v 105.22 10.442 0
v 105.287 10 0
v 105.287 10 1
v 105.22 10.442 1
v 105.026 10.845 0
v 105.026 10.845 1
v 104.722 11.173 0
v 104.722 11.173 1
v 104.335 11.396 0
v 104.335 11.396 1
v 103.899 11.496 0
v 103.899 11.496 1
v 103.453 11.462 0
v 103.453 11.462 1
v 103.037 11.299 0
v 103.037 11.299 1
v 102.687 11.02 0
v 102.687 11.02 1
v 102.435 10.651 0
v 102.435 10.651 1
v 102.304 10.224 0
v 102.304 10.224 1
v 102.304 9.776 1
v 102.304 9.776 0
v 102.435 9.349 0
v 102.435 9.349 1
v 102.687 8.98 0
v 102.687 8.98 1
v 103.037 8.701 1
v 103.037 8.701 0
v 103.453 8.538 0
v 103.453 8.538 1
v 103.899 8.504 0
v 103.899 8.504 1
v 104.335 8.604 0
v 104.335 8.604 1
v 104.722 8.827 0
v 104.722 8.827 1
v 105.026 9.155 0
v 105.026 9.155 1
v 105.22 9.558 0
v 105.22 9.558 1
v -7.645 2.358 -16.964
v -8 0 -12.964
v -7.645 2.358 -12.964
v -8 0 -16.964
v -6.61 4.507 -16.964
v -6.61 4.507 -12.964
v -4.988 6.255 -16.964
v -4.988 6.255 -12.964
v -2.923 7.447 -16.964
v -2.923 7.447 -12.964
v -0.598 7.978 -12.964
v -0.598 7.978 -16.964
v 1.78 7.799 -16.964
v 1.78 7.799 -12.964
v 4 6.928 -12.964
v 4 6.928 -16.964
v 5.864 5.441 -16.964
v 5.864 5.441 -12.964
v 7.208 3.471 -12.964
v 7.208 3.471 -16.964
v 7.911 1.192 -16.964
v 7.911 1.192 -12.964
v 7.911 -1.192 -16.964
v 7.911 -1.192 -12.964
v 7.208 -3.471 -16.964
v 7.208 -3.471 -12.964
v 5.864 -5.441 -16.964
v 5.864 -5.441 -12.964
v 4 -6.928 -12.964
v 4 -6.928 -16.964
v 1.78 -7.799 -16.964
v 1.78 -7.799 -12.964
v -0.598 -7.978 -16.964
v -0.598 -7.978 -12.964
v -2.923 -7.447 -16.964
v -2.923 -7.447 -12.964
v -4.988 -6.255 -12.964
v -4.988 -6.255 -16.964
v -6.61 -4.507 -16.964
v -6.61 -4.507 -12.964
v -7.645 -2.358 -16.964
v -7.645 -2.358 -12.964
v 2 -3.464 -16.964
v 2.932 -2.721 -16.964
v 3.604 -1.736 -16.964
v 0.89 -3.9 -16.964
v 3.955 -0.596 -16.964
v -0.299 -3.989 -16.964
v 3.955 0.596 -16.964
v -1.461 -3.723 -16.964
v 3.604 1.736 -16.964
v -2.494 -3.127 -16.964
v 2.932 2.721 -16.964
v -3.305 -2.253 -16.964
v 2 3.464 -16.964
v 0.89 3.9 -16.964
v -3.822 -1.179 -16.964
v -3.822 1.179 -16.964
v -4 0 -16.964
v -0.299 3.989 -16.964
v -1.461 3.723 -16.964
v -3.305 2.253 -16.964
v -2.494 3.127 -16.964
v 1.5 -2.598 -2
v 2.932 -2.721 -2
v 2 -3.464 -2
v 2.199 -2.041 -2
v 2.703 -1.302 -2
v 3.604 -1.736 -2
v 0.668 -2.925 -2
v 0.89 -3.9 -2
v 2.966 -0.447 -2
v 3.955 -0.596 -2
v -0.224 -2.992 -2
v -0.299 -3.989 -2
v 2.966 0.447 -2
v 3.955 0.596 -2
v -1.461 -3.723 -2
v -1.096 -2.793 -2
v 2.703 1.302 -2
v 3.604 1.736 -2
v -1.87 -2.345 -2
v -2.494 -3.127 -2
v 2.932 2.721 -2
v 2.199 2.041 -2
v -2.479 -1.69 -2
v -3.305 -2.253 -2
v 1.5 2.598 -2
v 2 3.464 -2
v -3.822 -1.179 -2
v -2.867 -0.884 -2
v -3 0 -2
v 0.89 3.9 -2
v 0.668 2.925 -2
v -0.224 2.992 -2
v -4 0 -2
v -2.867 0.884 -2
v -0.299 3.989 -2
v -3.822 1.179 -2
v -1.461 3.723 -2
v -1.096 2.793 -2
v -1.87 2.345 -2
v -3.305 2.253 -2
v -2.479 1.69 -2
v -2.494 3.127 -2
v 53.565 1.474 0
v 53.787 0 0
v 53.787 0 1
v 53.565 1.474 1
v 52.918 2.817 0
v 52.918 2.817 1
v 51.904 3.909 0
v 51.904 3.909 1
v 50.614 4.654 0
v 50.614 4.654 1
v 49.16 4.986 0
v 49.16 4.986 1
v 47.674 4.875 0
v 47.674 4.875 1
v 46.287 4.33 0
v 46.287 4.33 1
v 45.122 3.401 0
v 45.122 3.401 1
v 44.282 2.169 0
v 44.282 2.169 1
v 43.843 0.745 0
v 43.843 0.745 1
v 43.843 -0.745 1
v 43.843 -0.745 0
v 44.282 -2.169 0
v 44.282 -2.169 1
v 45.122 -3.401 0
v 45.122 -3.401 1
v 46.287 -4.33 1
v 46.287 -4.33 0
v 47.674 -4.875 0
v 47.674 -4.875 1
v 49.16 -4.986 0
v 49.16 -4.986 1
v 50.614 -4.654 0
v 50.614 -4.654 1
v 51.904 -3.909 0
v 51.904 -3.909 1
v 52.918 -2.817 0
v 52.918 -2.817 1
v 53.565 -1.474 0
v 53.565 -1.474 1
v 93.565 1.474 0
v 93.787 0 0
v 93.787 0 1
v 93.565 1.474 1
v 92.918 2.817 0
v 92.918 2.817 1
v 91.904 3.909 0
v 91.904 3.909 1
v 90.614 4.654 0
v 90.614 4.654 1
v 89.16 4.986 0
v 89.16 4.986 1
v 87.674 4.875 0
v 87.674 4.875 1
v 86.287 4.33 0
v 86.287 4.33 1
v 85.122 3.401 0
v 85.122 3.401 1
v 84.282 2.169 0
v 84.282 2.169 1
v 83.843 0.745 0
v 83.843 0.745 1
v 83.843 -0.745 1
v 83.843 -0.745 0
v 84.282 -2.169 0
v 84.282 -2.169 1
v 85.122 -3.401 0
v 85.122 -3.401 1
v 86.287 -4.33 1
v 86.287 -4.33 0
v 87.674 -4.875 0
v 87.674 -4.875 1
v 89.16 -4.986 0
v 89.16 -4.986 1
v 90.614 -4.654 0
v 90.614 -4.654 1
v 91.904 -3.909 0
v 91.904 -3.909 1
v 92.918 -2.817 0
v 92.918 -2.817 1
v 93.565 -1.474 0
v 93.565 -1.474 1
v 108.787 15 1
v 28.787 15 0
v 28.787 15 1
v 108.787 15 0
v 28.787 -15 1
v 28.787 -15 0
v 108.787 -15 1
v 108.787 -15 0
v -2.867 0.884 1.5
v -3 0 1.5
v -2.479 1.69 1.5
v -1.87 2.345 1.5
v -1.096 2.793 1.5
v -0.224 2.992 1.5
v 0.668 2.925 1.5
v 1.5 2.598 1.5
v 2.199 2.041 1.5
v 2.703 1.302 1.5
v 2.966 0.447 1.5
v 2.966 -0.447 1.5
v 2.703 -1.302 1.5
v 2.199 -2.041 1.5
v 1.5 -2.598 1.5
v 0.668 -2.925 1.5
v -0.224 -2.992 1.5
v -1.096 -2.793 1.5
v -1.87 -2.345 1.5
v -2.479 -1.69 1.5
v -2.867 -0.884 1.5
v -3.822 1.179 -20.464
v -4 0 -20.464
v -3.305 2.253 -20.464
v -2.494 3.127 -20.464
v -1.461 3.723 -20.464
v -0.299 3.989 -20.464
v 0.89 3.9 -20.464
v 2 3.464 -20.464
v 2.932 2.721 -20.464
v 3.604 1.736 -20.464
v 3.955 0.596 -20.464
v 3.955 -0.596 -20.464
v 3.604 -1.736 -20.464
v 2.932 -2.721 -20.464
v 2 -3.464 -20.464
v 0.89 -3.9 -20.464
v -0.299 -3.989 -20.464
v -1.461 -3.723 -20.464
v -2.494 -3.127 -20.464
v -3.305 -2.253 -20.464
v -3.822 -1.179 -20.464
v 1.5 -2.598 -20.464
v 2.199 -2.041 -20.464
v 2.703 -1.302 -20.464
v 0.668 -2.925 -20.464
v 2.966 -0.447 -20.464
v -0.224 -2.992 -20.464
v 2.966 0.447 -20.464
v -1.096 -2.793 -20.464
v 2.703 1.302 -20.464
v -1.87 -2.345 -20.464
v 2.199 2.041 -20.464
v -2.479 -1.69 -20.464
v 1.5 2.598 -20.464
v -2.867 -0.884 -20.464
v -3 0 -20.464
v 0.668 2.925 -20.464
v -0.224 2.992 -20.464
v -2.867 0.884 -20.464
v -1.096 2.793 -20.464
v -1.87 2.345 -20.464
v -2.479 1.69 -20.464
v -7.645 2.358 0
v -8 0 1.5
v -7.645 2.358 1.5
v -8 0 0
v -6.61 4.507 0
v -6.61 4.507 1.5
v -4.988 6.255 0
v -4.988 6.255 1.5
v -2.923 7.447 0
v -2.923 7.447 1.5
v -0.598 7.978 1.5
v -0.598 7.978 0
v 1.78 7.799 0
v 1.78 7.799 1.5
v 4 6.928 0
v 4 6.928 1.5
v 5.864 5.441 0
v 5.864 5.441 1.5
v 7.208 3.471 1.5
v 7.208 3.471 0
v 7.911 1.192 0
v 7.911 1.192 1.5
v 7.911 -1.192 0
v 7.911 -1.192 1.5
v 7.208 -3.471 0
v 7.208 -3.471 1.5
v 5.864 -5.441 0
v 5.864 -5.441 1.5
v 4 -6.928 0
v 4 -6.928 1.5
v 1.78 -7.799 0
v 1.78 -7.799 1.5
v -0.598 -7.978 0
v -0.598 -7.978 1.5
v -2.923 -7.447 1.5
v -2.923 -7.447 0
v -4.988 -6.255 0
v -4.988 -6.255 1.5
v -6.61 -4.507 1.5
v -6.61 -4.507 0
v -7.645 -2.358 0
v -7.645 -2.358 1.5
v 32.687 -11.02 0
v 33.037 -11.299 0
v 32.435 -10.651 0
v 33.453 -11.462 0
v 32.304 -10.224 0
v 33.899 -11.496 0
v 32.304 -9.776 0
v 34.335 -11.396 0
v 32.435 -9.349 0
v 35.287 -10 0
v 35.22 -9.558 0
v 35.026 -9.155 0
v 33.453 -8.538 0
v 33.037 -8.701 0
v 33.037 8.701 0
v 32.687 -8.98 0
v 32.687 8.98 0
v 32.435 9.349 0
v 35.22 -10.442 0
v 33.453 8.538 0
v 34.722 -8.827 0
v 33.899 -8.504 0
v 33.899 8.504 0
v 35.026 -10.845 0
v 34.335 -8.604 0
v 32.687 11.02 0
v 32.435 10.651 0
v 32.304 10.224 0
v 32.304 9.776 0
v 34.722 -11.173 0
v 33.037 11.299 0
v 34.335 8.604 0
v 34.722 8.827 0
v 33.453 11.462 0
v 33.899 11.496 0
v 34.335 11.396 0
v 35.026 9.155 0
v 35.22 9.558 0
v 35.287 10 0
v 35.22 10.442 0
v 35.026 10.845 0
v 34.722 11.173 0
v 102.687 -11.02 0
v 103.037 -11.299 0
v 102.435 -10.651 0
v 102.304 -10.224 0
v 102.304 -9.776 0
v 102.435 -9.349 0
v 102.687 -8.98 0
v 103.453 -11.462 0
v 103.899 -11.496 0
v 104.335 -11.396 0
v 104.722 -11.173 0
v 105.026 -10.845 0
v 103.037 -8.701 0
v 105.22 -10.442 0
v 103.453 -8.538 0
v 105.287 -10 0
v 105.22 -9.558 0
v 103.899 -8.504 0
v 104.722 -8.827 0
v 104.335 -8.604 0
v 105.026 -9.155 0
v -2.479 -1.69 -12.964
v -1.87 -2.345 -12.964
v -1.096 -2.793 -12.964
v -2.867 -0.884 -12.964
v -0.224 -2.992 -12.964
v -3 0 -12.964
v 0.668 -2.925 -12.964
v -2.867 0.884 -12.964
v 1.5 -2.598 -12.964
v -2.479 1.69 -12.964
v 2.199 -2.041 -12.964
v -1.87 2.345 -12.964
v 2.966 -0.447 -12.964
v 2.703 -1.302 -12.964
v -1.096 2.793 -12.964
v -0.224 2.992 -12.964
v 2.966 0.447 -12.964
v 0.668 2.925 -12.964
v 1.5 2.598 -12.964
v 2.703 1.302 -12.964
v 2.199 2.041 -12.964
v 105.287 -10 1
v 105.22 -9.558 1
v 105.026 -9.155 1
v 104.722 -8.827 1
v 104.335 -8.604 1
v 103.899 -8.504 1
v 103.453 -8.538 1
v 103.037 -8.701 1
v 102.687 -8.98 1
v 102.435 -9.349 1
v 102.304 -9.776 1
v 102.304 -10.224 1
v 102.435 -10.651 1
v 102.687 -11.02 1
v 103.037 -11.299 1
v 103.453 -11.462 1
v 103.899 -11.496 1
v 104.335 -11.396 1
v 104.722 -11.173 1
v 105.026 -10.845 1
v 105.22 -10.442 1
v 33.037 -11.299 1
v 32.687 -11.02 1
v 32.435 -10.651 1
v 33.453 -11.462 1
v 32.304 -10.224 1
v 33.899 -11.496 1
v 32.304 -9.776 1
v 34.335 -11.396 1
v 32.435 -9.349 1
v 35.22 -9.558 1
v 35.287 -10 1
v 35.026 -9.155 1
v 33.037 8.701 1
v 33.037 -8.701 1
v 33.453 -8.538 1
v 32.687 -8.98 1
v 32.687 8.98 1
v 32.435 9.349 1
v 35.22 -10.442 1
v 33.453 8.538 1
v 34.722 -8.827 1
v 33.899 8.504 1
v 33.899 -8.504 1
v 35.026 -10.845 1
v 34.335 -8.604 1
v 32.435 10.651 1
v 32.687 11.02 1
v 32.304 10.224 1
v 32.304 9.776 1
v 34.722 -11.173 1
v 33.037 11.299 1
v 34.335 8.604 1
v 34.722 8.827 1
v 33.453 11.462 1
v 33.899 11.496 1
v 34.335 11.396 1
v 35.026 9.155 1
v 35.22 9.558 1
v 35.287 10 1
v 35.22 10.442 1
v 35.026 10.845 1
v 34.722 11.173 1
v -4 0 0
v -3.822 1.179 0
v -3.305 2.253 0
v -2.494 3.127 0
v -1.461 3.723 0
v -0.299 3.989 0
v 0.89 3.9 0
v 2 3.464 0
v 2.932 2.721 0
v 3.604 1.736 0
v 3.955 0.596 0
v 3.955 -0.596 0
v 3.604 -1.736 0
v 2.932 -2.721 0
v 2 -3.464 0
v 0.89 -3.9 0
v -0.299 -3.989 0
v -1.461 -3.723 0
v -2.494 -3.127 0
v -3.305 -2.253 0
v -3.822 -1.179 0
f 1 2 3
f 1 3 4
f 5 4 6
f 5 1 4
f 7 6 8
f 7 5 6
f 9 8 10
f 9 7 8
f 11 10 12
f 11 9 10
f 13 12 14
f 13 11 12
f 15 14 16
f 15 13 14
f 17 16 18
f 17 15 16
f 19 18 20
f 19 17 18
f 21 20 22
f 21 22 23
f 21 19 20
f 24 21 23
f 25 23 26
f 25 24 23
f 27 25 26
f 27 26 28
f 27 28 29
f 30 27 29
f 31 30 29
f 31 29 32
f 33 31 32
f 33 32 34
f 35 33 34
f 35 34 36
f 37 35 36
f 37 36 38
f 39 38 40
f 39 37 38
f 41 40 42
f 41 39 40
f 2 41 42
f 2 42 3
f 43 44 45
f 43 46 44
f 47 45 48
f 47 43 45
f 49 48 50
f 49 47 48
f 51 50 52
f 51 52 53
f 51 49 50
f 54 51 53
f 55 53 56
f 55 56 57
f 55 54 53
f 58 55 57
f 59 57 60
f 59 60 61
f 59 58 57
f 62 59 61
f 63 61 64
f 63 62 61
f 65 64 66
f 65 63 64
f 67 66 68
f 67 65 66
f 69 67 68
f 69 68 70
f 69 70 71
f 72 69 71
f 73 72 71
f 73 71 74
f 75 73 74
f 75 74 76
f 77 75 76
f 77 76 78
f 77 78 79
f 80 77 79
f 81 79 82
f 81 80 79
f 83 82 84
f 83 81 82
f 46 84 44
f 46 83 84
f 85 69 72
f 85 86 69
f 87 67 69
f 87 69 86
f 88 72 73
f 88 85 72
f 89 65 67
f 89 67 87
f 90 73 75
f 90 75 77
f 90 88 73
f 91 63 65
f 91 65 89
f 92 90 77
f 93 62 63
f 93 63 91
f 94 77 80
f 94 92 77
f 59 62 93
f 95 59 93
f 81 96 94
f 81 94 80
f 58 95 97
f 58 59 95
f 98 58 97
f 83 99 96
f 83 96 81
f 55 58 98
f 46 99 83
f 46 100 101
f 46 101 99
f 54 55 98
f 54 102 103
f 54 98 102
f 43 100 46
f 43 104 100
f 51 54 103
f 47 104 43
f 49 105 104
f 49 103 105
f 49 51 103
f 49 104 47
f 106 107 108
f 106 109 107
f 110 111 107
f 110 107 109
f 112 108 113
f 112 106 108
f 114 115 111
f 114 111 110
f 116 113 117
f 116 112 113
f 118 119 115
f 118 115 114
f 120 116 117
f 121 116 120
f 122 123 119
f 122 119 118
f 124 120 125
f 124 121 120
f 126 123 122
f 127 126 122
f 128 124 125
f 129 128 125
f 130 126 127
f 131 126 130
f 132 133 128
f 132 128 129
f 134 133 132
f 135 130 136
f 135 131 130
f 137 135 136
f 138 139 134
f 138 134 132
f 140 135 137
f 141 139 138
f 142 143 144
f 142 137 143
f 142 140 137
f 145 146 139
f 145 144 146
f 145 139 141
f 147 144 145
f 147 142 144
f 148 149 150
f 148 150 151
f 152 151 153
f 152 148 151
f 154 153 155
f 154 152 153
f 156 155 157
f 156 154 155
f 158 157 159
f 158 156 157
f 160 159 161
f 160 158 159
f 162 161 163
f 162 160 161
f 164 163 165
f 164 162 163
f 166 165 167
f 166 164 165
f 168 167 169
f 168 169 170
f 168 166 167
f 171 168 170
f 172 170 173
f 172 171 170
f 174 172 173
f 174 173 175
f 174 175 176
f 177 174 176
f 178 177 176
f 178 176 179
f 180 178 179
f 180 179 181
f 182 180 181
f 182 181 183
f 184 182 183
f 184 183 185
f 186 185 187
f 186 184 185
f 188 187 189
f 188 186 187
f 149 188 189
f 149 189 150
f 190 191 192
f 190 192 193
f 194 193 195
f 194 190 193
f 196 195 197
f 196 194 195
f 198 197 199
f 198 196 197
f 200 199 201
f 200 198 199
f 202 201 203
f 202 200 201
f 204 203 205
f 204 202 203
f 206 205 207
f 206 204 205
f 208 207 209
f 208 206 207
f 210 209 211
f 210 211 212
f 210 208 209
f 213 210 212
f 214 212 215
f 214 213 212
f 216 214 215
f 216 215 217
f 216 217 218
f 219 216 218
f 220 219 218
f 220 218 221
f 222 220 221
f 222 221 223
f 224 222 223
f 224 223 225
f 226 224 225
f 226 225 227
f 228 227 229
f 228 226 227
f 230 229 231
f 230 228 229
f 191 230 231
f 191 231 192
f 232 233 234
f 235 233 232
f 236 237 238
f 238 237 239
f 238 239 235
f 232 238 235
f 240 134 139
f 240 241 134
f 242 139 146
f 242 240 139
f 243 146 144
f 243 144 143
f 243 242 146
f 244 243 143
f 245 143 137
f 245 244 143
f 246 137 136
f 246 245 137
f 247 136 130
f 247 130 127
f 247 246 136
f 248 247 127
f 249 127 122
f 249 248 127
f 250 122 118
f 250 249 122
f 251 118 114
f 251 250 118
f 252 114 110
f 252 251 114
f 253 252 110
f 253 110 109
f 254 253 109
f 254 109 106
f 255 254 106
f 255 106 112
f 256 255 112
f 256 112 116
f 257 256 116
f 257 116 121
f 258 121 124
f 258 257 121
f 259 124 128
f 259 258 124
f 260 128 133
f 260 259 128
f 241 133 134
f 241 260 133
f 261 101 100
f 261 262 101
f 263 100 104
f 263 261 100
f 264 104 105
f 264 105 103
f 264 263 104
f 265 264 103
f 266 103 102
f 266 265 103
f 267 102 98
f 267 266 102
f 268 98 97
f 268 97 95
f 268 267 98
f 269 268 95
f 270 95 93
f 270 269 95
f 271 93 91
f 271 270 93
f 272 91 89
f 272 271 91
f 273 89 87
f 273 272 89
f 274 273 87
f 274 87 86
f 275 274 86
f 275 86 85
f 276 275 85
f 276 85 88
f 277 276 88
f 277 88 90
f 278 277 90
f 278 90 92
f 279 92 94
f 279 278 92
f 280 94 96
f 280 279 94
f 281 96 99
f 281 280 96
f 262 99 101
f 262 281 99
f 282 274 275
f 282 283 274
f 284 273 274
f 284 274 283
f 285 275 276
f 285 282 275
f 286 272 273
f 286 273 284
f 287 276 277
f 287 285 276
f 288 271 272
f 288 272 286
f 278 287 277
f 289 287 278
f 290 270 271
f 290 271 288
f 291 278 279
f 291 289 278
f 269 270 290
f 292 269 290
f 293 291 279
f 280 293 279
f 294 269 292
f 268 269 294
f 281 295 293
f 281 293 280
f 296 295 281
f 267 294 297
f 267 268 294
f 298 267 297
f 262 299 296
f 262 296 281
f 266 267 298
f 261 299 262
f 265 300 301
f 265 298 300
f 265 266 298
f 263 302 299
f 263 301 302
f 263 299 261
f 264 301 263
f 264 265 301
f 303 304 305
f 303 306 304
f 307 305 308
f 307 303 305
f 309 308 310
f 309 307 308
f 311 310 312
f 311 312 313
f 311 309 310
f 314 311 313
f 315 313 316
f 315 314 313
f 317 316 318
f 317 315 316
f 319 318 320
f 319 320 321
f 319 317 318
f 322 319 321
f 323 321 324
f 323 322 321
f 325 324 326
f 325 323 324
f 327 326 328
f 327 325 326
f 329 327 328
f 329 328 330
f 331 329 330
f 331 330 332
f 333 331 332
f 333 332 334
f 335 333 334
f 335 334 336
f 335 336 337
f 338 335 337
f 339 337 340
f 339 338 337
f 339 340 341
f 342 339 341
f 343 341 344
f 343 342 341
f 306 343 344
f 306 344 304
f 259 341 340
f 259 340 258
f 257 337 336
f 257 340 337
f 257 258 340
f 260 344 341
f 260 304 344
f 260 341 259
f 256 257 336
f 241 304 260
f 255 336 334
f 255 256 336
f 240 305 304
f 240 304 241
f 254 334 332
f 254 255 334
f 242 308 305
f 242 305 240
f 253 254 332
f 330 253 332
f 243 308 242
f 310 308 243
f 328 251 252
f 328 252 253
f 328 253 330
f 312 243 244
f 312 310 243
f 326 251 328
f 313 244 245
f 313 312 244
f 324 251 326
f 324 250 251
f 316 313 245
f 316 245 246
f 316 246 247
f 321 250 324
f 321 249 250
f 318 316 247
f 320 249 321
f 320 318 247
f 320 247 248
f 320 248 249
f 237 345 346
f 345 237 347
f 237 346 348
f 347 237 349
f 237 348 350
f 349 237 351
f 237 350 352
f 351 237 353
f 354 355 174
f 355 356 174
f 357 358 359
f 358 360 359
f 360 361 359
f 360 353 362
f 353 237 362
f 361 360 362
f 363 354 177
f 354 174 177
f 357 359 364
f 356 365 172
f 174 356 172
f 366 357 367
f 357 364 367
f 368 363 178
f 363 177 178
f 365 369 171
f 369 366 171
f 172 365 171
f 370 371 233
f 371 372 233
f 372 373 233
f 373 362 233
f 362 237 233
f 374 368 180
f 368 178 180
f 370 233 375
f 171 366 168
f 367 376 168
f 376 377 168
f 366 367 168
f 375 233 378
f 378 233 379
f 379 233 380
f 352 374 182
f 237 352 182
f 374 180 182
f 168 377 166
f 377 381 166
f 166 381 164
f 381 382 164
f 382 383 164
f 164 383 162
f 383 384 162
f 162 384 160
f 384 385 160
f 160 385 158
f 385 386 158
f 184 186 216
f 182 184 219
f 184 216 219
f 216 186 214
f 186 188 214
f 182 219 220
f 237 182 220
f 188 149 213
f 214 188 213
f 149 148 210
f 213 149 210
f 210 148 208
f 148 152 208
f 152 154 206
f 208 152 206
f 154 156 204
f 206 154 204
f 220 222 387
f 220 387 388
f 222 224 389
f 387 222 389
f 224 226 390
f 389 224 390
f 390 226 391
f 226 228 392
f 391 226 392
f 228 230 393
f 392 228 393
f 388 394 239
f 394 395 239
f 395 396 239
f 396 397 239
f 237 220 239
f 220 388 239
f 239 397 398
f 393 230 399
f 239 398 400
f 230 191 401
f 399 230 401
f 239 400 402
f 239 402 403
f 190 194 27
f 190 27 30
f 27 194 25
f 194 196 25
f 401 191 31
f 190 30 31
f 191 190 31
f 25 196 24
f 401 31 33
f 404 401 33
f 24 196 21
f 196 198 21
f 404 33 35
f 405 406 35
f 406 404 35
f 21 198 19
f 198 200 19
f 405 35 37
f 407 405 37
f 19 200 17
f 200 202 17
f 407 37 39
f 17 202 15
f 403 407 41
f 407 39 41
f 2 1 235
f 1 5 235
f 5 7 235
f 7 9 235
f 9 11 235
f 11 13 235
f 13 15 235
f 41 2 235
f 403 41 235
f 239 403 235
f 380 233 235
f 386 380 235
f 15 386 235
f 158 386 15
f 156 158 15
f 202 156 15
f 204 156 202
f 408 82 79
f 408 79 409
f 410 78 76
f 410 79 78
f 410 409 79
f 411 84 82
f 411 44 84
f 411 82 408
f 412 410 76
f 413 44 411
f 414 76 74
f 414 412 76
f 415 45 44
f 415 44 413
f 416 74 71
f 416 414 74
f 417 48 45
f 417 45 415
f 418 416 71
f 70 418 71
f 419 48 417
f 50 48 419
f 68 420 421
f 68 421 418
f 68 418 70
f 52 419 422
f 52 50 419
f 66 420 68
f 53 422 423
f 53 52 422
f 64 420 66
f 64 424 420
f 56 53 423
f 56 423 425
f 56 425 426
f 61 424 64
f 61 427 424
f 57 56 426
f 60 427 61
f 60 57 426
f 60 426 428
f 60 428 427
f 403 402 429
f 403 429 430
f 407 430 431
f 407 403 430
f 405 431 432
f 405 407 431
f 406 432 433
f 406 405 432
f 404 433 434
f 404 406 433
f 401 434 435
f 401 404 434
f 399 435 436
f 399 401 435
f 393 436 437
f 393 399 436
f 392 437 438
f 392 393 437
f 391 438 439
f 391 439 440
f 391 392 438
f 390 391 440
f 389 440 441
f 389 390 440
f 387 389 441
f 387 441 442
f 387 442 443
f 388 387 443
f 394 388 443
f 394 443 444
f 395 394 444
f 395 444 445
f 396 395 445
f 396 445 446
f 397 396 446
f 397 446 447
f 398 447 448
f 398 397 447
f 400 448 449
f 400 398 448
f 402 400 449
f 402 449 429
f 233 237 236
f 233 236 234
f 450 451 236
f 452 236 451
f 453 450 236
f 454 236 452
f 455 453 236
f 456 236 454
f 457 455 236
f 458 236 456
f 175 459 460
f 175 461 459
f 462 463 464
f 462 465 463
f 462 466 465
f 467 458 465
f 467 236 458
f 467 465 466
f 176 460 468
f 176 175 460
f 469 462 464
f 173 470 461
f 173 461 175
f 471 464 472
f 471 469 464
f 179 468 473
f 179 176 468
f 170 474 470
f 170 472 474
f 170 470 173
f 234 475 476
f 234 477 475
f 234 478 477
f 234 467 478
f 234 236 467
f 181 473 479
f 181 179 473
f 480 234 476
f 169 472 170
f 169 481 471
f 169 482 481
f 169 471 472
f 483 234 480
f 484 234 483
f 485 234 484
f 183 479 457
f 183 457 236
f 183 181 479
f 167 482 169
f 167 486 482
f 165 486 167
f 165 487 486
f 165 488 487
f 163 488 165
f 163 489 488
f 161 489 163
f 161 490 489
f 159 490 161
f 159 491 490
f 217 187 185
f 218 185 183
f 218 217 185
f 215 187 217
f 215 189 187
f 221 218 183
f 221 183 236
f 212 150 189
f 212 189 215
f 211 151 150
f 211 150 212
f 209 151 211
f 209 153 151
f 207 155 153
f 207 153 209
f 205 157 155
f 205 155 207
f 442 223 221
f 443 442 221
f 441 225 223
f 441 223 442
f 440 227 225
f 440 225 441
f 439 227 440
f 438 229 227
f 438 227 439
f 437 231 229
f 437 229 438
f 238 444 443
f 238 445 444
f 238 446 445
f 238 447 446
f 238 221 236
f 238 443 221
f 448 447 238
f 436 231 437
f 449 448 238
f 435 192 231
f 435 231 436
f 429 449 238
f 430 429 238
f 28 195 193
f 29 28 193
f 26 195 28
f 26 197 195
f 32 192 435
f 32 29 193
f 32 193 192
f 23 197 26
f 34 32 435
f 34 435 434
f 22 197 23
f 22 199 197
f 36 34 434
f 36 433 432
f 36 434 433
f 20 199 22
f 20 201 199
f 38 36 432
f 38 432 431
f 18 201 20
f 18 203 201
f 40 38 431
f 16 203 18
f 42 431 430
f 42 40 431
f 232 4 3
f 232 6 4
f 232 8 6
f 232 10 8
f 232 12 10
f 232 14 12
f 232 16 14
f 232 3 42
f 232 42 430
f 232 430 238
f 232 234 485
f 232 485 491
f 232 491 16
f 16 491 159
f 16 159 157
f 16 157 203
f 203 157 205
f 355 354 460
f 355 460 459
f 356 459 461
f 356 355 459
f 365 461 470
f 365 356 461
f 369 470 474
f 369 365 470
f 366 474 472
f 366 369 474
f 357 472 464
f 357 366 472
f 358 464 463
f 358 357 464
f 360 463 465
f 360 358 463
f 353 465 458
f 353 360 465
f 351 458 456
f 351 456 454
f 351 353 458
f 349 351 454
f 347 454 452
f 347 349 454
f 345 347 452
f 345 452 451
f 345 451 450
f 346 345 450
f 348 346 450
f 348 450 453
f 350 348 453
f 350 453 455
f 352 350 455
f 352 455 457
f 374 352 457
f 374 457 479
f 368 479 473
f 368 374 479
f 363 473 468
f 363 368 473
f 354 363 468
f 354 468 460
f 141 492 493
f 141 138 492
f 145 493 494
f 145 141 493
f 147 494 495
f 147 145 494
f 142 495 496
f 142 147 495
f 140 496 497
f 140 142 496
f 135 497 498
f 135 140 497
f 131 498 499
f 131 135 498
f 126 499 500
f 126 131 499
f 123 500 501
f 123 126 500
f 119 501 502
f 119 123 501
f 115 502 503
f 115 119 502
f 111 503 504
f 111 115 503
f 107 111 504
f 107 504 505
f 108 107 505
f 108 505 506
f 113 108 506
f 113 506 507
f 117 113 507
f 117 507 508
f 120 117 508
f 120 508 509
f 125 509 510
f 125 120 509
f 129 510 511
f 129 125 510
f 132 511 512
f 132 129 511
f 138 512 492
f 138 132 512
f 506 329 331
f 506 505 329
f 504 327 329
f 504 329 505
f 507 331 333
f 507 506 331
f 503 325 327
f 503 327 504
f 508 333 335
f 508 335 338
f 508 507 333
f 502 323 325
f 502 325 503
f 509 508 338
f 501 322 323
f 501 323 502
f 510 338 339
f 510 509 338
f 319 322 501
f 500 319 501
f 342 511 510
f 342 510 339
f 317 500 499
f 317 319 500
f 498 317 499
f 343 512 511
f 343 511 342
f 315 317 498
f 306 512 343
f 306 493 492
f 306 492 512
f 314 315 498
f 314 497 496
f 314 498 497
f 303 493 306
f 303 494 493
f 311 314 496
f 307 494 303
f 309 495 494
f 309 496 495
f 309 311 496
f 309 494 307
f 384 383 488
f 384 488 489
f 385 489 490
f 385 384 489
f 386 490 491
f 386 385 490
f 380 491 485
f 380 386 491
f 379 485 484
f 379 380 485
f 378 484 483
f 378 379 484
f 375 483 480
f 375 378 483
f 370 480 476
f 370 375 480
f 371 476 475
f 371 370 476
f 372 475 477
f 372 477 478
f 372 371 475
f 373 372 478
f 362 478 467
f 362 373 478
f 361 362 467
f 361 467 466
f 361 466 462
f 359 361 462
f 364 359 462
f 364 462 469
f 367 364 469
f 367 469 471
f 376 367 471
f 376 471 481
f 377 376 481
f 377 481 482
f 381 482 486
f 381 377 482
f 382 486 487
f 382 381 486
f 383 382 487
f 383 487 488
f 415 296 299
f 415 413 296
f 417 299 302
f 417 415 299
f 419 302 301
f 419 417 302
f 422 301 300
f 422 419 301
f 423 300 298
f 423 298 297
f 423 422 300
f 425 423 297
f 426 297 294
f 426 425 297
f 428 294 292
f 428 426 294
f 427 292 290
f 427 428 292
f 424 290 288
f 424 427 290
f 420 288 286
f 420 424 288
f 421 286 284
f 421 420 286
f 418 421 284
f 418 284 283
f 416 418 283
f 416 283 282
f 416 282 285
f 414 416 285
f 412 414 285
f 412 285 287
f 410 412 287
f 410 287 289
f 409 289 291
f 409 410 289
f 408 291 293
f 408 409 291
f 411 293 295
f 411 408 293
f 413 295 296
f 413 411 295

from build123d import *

# Parameters (mm, degrees)
F2_W     = 80
F2_H     = 30
F2_R     = 1.5
F2_R_2   = 5
F3_DEPTH = 1


with BuildPart() as f1:
    # F0 (on Front) → F1 (revolve)
    with BuildSketch(Plane.XZ):
        Polygon((-3, -2), (-3, 1.5), (-8, 1.5), (-8, 0), (-4, 0), (-4, -2), align=None)
    revolve(axis=Axis((0, 0, 2.077047), (0, 0, -1)))


with BuildPart() as f3:
    # F2 (on Top) → F3 (new body)
    with BuildSketch(Plane.XY):
        with Locations((68.786818, 0)):
            Rectangle(F2_W, F2_H)
        with Locations((33.786818, -10)):
            Circle(F2_R, mode=Mode.SUBTRACT)
        with Locations((103.786818, -10)):
            Circle(F2_R, mode=Mode.SUBTRACT)
        with Locations((48.786818, 0)):
            Circle(F2_R_2, mode=Mode.SUBTRACT)
        with Locations((33.786818, 10)):
            Circle(F2_R, mode=Mode.SUBTRACT)
        with Locations((88.786818, 0)):
            Circle(F2_R_2, mode=Mode.SUBTRACT)
        with Locations((103.786818, 10)):
            Circle(F2_R, mode=Mode.SUBTRACT)
    extrude(amount=F3_DEPTH)


with BuildPart() as f5:
    # F4 (on Front) → F5 (revolve)
    with BuildSketch(Plane.XZ):
        Polygon((-3, -20.464356), (-3, -12.964356), (-8, -12.964356), (-8, -16.964356), (-4, -16.964356), (-4, -20.464356), align=None)
    revolve(axis=Axis((0, 0, -17.545227), (0, 0, -1)))


solid = Compound([f1.part, f3.part, f5.part])
